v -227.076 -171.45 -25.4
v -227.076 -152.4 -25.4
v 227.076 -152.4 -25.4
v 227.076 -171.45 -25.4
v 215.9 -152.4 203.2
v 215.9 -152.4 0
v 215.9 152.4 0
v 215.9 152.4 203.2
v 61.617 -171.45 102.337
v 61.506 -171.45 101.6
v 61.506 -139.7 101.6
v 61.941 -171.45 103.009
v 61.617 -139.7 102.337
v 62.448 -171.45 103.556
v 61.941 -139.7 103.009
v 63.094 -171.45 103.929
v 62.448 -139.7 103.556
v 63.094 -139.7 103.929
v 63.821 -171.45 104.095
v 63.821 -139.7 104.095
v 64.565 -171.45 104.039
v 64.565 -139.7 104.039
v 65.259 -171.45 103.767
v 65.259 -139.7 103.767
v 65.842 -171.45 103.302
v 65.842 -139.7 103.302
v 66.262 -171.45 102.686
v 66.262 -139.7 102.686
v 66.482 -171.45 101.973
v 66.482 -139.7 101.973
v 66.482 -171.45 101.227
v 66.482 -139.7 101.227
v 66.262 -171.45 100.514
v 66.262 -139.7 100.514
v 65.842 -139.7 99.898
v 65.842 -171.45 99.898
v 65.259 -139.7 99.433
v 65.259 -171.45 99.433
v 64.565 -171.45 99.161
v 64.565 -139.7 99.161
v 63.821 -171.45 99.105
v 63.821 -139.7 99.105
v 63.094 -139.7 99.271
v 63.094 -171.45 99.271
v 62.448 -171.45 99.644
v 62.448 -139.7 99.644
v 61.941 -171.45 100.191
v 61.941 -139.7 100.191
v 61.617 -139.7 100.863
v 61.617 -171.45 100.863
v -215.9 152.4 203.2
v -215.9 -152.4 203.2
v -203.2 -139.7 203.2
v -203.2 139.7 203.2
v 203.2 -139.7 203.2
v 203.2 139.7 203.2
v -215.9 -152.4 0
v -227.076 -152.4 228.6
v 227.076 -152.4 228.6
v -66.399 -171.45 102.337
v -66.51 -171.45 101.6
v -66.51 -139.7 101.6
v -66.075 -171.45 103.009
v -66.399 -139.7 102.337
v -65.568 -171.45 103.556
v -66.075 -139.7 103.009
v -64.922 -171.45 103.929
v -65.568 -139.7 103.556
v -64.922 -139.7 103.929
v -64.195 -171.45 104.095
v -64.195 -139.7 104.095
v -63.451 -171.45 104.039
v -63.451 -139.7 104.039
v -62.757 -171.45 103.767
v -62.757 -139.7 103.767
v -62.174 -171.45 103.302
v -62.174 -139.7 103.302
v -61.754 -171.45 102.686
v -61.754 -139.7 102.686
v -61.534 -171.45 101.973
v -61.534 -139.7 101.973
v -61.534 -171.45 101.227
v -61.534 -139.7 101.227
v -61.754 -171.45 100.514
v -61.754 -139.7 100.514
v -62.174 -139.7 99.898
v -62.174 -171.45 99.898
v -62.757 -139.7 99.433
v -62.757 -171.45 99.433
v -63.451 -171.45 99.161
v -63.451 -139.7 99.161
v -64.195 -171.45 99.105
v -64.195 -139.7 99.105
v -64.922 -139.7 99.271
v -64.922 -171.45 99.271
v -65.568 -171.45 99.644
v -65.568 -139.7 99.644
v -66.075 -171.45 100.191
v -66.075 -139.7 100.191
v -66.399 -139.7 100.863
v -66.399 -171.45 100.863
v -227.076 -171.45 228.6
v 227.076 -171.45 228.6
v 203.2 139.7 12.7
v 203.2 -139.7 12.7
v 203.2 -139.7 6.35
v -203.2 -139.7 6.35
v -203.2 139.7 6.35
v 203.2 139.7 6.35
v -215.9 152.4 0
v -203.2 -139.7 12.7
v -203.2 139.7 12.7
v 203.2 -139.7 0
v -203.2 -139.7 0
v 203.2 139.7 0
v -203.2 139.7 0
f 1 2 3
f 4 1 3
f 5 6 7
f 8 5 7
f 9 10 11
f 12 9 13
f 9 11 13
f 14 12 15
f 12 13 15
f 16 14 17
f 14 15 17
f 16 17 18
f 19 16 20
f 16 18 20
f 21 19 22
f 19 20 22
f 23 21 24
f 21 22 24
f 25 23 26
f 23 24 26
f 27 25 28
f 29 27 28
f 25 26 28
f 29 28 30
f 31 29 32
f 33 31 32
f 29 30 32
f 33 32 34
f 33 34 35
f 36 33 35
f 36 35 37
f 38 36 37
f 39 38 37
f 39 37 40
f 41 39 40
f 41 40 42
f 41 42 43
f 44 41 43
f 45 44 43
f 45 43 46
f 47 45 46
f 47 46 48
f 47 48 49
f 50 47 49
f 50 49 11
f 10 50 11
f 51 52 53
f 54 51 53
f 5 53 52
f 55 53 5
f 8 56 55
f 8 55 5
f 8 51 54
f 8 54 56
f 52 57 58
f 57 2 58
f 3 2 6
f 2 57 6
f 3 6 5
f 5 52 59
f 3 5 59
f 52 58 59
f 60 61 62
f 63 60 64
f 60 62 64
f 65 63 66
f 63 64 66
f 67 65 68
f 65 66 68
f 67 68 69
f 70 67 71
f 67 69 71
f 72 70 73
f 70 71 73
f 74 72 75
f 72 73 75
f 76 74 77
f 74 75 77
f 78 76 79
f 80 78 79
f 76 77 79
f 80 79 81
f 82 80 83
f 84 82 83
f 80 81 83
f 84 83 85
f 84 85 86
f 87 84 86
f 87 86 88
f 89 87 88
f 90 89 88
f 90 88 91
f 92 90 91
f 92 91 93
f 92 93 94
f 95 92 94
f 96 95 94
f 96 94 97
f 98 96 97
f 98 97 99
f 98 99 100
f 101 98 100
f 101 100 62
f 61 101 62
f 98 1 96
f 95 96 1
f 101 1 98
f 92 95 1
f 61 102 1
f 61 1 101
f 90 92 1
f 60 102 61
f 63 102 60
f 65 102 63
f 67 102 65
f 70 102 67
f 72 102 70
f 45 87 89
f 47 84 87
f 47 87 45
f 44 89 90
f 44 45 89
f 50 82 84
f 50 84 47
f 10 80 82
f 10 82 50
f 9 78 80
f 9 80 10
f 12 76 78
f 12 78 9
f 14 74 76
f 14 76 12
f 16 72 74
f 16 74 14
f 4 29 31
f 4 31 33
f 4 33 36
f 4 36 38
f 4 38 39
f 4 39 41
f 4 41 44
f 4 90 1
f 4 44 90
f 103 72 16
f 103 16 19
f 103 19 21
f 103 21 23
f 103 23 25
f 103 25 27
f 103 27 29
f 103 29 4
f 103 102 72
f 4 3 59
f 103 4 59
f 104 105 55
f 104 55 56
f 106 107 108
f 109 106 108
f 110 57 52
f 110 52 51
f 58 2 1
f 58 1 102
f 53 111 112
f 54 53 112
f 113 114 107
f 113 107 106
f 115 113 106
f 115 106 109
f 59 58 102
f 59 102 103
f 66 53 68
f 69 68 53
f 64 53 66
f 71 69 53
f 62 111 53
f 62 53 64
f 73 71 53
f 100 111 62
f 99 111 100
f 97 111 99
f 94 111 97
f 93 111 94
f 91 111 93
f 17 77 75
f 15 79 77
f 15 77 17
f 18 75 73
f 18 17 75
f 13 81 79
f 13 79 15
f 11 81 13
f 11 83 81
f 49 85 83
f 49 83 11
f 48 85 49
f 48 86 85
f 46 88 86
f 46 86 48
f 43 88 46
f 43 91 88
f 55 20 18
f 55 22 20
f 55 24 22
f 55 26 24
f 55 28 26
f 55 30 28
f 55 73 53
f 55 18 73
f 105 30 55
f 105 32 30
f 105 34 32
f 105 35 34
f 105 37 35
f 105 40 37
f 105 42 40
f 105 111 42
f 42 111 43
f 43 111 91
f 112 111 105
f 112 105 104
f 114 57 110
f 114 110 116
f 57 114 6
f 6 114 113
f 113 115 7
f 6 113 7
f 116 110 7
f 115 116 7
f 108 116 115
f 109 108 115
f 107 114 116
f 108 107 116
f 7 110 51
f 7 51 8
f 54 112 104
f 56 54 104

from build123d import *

# Parameters (mm, degrees)
F0_W     = 431.8
F0_H     = 304.8
F0_W_2   = 406.4
F0_H_2   = 279.4
F1_DEPTH = 203.2
F2_W     = 279.4
F2_H     = 6.35
F3_DEPTH = 406.4
F4_W     = 454.152
F4_H     = 254
F5_DEPTH = 19.05
F7_D     = 5.0038
F7_DEPTH = 31.75


with BuildPart() as f1:
    # F0 (on Top) → F1 (new body)
    with BuildSketch(Plane.XY):
        Rectangle(F0_W, F0_H)
        Rectangle(F0_W_2, F0_H_2, mode=Mode.SUBTRACT)
    extrude(amount=F1_DEPTH)

    # F2 (on face) → F3 (join, through all)
    with BuildSketch(Plane.YZ.offset(-203.2)):
        with Locations((0, 9.525)):
            Rectangle(F2_W, F2_H)
    extrude(amount=F3_DEPTH)

    # F4 (on face) → F5 (join)
    with BuildSketch(Plane.XZ.offset(152.4)):
        with Locations((0, 101.6)):
            Rectangle(F4_W, F4_H)
    extrude(amount=F5_DEPTH)

    # F7
    with Locations(Plane.XZ.offset(171.45)):
        with Locations((-64.008, 101.6), (64.008, 101.6)):
            Hole(F7_D / 2, depth=F7_DEPTH)


solid = f1.part
